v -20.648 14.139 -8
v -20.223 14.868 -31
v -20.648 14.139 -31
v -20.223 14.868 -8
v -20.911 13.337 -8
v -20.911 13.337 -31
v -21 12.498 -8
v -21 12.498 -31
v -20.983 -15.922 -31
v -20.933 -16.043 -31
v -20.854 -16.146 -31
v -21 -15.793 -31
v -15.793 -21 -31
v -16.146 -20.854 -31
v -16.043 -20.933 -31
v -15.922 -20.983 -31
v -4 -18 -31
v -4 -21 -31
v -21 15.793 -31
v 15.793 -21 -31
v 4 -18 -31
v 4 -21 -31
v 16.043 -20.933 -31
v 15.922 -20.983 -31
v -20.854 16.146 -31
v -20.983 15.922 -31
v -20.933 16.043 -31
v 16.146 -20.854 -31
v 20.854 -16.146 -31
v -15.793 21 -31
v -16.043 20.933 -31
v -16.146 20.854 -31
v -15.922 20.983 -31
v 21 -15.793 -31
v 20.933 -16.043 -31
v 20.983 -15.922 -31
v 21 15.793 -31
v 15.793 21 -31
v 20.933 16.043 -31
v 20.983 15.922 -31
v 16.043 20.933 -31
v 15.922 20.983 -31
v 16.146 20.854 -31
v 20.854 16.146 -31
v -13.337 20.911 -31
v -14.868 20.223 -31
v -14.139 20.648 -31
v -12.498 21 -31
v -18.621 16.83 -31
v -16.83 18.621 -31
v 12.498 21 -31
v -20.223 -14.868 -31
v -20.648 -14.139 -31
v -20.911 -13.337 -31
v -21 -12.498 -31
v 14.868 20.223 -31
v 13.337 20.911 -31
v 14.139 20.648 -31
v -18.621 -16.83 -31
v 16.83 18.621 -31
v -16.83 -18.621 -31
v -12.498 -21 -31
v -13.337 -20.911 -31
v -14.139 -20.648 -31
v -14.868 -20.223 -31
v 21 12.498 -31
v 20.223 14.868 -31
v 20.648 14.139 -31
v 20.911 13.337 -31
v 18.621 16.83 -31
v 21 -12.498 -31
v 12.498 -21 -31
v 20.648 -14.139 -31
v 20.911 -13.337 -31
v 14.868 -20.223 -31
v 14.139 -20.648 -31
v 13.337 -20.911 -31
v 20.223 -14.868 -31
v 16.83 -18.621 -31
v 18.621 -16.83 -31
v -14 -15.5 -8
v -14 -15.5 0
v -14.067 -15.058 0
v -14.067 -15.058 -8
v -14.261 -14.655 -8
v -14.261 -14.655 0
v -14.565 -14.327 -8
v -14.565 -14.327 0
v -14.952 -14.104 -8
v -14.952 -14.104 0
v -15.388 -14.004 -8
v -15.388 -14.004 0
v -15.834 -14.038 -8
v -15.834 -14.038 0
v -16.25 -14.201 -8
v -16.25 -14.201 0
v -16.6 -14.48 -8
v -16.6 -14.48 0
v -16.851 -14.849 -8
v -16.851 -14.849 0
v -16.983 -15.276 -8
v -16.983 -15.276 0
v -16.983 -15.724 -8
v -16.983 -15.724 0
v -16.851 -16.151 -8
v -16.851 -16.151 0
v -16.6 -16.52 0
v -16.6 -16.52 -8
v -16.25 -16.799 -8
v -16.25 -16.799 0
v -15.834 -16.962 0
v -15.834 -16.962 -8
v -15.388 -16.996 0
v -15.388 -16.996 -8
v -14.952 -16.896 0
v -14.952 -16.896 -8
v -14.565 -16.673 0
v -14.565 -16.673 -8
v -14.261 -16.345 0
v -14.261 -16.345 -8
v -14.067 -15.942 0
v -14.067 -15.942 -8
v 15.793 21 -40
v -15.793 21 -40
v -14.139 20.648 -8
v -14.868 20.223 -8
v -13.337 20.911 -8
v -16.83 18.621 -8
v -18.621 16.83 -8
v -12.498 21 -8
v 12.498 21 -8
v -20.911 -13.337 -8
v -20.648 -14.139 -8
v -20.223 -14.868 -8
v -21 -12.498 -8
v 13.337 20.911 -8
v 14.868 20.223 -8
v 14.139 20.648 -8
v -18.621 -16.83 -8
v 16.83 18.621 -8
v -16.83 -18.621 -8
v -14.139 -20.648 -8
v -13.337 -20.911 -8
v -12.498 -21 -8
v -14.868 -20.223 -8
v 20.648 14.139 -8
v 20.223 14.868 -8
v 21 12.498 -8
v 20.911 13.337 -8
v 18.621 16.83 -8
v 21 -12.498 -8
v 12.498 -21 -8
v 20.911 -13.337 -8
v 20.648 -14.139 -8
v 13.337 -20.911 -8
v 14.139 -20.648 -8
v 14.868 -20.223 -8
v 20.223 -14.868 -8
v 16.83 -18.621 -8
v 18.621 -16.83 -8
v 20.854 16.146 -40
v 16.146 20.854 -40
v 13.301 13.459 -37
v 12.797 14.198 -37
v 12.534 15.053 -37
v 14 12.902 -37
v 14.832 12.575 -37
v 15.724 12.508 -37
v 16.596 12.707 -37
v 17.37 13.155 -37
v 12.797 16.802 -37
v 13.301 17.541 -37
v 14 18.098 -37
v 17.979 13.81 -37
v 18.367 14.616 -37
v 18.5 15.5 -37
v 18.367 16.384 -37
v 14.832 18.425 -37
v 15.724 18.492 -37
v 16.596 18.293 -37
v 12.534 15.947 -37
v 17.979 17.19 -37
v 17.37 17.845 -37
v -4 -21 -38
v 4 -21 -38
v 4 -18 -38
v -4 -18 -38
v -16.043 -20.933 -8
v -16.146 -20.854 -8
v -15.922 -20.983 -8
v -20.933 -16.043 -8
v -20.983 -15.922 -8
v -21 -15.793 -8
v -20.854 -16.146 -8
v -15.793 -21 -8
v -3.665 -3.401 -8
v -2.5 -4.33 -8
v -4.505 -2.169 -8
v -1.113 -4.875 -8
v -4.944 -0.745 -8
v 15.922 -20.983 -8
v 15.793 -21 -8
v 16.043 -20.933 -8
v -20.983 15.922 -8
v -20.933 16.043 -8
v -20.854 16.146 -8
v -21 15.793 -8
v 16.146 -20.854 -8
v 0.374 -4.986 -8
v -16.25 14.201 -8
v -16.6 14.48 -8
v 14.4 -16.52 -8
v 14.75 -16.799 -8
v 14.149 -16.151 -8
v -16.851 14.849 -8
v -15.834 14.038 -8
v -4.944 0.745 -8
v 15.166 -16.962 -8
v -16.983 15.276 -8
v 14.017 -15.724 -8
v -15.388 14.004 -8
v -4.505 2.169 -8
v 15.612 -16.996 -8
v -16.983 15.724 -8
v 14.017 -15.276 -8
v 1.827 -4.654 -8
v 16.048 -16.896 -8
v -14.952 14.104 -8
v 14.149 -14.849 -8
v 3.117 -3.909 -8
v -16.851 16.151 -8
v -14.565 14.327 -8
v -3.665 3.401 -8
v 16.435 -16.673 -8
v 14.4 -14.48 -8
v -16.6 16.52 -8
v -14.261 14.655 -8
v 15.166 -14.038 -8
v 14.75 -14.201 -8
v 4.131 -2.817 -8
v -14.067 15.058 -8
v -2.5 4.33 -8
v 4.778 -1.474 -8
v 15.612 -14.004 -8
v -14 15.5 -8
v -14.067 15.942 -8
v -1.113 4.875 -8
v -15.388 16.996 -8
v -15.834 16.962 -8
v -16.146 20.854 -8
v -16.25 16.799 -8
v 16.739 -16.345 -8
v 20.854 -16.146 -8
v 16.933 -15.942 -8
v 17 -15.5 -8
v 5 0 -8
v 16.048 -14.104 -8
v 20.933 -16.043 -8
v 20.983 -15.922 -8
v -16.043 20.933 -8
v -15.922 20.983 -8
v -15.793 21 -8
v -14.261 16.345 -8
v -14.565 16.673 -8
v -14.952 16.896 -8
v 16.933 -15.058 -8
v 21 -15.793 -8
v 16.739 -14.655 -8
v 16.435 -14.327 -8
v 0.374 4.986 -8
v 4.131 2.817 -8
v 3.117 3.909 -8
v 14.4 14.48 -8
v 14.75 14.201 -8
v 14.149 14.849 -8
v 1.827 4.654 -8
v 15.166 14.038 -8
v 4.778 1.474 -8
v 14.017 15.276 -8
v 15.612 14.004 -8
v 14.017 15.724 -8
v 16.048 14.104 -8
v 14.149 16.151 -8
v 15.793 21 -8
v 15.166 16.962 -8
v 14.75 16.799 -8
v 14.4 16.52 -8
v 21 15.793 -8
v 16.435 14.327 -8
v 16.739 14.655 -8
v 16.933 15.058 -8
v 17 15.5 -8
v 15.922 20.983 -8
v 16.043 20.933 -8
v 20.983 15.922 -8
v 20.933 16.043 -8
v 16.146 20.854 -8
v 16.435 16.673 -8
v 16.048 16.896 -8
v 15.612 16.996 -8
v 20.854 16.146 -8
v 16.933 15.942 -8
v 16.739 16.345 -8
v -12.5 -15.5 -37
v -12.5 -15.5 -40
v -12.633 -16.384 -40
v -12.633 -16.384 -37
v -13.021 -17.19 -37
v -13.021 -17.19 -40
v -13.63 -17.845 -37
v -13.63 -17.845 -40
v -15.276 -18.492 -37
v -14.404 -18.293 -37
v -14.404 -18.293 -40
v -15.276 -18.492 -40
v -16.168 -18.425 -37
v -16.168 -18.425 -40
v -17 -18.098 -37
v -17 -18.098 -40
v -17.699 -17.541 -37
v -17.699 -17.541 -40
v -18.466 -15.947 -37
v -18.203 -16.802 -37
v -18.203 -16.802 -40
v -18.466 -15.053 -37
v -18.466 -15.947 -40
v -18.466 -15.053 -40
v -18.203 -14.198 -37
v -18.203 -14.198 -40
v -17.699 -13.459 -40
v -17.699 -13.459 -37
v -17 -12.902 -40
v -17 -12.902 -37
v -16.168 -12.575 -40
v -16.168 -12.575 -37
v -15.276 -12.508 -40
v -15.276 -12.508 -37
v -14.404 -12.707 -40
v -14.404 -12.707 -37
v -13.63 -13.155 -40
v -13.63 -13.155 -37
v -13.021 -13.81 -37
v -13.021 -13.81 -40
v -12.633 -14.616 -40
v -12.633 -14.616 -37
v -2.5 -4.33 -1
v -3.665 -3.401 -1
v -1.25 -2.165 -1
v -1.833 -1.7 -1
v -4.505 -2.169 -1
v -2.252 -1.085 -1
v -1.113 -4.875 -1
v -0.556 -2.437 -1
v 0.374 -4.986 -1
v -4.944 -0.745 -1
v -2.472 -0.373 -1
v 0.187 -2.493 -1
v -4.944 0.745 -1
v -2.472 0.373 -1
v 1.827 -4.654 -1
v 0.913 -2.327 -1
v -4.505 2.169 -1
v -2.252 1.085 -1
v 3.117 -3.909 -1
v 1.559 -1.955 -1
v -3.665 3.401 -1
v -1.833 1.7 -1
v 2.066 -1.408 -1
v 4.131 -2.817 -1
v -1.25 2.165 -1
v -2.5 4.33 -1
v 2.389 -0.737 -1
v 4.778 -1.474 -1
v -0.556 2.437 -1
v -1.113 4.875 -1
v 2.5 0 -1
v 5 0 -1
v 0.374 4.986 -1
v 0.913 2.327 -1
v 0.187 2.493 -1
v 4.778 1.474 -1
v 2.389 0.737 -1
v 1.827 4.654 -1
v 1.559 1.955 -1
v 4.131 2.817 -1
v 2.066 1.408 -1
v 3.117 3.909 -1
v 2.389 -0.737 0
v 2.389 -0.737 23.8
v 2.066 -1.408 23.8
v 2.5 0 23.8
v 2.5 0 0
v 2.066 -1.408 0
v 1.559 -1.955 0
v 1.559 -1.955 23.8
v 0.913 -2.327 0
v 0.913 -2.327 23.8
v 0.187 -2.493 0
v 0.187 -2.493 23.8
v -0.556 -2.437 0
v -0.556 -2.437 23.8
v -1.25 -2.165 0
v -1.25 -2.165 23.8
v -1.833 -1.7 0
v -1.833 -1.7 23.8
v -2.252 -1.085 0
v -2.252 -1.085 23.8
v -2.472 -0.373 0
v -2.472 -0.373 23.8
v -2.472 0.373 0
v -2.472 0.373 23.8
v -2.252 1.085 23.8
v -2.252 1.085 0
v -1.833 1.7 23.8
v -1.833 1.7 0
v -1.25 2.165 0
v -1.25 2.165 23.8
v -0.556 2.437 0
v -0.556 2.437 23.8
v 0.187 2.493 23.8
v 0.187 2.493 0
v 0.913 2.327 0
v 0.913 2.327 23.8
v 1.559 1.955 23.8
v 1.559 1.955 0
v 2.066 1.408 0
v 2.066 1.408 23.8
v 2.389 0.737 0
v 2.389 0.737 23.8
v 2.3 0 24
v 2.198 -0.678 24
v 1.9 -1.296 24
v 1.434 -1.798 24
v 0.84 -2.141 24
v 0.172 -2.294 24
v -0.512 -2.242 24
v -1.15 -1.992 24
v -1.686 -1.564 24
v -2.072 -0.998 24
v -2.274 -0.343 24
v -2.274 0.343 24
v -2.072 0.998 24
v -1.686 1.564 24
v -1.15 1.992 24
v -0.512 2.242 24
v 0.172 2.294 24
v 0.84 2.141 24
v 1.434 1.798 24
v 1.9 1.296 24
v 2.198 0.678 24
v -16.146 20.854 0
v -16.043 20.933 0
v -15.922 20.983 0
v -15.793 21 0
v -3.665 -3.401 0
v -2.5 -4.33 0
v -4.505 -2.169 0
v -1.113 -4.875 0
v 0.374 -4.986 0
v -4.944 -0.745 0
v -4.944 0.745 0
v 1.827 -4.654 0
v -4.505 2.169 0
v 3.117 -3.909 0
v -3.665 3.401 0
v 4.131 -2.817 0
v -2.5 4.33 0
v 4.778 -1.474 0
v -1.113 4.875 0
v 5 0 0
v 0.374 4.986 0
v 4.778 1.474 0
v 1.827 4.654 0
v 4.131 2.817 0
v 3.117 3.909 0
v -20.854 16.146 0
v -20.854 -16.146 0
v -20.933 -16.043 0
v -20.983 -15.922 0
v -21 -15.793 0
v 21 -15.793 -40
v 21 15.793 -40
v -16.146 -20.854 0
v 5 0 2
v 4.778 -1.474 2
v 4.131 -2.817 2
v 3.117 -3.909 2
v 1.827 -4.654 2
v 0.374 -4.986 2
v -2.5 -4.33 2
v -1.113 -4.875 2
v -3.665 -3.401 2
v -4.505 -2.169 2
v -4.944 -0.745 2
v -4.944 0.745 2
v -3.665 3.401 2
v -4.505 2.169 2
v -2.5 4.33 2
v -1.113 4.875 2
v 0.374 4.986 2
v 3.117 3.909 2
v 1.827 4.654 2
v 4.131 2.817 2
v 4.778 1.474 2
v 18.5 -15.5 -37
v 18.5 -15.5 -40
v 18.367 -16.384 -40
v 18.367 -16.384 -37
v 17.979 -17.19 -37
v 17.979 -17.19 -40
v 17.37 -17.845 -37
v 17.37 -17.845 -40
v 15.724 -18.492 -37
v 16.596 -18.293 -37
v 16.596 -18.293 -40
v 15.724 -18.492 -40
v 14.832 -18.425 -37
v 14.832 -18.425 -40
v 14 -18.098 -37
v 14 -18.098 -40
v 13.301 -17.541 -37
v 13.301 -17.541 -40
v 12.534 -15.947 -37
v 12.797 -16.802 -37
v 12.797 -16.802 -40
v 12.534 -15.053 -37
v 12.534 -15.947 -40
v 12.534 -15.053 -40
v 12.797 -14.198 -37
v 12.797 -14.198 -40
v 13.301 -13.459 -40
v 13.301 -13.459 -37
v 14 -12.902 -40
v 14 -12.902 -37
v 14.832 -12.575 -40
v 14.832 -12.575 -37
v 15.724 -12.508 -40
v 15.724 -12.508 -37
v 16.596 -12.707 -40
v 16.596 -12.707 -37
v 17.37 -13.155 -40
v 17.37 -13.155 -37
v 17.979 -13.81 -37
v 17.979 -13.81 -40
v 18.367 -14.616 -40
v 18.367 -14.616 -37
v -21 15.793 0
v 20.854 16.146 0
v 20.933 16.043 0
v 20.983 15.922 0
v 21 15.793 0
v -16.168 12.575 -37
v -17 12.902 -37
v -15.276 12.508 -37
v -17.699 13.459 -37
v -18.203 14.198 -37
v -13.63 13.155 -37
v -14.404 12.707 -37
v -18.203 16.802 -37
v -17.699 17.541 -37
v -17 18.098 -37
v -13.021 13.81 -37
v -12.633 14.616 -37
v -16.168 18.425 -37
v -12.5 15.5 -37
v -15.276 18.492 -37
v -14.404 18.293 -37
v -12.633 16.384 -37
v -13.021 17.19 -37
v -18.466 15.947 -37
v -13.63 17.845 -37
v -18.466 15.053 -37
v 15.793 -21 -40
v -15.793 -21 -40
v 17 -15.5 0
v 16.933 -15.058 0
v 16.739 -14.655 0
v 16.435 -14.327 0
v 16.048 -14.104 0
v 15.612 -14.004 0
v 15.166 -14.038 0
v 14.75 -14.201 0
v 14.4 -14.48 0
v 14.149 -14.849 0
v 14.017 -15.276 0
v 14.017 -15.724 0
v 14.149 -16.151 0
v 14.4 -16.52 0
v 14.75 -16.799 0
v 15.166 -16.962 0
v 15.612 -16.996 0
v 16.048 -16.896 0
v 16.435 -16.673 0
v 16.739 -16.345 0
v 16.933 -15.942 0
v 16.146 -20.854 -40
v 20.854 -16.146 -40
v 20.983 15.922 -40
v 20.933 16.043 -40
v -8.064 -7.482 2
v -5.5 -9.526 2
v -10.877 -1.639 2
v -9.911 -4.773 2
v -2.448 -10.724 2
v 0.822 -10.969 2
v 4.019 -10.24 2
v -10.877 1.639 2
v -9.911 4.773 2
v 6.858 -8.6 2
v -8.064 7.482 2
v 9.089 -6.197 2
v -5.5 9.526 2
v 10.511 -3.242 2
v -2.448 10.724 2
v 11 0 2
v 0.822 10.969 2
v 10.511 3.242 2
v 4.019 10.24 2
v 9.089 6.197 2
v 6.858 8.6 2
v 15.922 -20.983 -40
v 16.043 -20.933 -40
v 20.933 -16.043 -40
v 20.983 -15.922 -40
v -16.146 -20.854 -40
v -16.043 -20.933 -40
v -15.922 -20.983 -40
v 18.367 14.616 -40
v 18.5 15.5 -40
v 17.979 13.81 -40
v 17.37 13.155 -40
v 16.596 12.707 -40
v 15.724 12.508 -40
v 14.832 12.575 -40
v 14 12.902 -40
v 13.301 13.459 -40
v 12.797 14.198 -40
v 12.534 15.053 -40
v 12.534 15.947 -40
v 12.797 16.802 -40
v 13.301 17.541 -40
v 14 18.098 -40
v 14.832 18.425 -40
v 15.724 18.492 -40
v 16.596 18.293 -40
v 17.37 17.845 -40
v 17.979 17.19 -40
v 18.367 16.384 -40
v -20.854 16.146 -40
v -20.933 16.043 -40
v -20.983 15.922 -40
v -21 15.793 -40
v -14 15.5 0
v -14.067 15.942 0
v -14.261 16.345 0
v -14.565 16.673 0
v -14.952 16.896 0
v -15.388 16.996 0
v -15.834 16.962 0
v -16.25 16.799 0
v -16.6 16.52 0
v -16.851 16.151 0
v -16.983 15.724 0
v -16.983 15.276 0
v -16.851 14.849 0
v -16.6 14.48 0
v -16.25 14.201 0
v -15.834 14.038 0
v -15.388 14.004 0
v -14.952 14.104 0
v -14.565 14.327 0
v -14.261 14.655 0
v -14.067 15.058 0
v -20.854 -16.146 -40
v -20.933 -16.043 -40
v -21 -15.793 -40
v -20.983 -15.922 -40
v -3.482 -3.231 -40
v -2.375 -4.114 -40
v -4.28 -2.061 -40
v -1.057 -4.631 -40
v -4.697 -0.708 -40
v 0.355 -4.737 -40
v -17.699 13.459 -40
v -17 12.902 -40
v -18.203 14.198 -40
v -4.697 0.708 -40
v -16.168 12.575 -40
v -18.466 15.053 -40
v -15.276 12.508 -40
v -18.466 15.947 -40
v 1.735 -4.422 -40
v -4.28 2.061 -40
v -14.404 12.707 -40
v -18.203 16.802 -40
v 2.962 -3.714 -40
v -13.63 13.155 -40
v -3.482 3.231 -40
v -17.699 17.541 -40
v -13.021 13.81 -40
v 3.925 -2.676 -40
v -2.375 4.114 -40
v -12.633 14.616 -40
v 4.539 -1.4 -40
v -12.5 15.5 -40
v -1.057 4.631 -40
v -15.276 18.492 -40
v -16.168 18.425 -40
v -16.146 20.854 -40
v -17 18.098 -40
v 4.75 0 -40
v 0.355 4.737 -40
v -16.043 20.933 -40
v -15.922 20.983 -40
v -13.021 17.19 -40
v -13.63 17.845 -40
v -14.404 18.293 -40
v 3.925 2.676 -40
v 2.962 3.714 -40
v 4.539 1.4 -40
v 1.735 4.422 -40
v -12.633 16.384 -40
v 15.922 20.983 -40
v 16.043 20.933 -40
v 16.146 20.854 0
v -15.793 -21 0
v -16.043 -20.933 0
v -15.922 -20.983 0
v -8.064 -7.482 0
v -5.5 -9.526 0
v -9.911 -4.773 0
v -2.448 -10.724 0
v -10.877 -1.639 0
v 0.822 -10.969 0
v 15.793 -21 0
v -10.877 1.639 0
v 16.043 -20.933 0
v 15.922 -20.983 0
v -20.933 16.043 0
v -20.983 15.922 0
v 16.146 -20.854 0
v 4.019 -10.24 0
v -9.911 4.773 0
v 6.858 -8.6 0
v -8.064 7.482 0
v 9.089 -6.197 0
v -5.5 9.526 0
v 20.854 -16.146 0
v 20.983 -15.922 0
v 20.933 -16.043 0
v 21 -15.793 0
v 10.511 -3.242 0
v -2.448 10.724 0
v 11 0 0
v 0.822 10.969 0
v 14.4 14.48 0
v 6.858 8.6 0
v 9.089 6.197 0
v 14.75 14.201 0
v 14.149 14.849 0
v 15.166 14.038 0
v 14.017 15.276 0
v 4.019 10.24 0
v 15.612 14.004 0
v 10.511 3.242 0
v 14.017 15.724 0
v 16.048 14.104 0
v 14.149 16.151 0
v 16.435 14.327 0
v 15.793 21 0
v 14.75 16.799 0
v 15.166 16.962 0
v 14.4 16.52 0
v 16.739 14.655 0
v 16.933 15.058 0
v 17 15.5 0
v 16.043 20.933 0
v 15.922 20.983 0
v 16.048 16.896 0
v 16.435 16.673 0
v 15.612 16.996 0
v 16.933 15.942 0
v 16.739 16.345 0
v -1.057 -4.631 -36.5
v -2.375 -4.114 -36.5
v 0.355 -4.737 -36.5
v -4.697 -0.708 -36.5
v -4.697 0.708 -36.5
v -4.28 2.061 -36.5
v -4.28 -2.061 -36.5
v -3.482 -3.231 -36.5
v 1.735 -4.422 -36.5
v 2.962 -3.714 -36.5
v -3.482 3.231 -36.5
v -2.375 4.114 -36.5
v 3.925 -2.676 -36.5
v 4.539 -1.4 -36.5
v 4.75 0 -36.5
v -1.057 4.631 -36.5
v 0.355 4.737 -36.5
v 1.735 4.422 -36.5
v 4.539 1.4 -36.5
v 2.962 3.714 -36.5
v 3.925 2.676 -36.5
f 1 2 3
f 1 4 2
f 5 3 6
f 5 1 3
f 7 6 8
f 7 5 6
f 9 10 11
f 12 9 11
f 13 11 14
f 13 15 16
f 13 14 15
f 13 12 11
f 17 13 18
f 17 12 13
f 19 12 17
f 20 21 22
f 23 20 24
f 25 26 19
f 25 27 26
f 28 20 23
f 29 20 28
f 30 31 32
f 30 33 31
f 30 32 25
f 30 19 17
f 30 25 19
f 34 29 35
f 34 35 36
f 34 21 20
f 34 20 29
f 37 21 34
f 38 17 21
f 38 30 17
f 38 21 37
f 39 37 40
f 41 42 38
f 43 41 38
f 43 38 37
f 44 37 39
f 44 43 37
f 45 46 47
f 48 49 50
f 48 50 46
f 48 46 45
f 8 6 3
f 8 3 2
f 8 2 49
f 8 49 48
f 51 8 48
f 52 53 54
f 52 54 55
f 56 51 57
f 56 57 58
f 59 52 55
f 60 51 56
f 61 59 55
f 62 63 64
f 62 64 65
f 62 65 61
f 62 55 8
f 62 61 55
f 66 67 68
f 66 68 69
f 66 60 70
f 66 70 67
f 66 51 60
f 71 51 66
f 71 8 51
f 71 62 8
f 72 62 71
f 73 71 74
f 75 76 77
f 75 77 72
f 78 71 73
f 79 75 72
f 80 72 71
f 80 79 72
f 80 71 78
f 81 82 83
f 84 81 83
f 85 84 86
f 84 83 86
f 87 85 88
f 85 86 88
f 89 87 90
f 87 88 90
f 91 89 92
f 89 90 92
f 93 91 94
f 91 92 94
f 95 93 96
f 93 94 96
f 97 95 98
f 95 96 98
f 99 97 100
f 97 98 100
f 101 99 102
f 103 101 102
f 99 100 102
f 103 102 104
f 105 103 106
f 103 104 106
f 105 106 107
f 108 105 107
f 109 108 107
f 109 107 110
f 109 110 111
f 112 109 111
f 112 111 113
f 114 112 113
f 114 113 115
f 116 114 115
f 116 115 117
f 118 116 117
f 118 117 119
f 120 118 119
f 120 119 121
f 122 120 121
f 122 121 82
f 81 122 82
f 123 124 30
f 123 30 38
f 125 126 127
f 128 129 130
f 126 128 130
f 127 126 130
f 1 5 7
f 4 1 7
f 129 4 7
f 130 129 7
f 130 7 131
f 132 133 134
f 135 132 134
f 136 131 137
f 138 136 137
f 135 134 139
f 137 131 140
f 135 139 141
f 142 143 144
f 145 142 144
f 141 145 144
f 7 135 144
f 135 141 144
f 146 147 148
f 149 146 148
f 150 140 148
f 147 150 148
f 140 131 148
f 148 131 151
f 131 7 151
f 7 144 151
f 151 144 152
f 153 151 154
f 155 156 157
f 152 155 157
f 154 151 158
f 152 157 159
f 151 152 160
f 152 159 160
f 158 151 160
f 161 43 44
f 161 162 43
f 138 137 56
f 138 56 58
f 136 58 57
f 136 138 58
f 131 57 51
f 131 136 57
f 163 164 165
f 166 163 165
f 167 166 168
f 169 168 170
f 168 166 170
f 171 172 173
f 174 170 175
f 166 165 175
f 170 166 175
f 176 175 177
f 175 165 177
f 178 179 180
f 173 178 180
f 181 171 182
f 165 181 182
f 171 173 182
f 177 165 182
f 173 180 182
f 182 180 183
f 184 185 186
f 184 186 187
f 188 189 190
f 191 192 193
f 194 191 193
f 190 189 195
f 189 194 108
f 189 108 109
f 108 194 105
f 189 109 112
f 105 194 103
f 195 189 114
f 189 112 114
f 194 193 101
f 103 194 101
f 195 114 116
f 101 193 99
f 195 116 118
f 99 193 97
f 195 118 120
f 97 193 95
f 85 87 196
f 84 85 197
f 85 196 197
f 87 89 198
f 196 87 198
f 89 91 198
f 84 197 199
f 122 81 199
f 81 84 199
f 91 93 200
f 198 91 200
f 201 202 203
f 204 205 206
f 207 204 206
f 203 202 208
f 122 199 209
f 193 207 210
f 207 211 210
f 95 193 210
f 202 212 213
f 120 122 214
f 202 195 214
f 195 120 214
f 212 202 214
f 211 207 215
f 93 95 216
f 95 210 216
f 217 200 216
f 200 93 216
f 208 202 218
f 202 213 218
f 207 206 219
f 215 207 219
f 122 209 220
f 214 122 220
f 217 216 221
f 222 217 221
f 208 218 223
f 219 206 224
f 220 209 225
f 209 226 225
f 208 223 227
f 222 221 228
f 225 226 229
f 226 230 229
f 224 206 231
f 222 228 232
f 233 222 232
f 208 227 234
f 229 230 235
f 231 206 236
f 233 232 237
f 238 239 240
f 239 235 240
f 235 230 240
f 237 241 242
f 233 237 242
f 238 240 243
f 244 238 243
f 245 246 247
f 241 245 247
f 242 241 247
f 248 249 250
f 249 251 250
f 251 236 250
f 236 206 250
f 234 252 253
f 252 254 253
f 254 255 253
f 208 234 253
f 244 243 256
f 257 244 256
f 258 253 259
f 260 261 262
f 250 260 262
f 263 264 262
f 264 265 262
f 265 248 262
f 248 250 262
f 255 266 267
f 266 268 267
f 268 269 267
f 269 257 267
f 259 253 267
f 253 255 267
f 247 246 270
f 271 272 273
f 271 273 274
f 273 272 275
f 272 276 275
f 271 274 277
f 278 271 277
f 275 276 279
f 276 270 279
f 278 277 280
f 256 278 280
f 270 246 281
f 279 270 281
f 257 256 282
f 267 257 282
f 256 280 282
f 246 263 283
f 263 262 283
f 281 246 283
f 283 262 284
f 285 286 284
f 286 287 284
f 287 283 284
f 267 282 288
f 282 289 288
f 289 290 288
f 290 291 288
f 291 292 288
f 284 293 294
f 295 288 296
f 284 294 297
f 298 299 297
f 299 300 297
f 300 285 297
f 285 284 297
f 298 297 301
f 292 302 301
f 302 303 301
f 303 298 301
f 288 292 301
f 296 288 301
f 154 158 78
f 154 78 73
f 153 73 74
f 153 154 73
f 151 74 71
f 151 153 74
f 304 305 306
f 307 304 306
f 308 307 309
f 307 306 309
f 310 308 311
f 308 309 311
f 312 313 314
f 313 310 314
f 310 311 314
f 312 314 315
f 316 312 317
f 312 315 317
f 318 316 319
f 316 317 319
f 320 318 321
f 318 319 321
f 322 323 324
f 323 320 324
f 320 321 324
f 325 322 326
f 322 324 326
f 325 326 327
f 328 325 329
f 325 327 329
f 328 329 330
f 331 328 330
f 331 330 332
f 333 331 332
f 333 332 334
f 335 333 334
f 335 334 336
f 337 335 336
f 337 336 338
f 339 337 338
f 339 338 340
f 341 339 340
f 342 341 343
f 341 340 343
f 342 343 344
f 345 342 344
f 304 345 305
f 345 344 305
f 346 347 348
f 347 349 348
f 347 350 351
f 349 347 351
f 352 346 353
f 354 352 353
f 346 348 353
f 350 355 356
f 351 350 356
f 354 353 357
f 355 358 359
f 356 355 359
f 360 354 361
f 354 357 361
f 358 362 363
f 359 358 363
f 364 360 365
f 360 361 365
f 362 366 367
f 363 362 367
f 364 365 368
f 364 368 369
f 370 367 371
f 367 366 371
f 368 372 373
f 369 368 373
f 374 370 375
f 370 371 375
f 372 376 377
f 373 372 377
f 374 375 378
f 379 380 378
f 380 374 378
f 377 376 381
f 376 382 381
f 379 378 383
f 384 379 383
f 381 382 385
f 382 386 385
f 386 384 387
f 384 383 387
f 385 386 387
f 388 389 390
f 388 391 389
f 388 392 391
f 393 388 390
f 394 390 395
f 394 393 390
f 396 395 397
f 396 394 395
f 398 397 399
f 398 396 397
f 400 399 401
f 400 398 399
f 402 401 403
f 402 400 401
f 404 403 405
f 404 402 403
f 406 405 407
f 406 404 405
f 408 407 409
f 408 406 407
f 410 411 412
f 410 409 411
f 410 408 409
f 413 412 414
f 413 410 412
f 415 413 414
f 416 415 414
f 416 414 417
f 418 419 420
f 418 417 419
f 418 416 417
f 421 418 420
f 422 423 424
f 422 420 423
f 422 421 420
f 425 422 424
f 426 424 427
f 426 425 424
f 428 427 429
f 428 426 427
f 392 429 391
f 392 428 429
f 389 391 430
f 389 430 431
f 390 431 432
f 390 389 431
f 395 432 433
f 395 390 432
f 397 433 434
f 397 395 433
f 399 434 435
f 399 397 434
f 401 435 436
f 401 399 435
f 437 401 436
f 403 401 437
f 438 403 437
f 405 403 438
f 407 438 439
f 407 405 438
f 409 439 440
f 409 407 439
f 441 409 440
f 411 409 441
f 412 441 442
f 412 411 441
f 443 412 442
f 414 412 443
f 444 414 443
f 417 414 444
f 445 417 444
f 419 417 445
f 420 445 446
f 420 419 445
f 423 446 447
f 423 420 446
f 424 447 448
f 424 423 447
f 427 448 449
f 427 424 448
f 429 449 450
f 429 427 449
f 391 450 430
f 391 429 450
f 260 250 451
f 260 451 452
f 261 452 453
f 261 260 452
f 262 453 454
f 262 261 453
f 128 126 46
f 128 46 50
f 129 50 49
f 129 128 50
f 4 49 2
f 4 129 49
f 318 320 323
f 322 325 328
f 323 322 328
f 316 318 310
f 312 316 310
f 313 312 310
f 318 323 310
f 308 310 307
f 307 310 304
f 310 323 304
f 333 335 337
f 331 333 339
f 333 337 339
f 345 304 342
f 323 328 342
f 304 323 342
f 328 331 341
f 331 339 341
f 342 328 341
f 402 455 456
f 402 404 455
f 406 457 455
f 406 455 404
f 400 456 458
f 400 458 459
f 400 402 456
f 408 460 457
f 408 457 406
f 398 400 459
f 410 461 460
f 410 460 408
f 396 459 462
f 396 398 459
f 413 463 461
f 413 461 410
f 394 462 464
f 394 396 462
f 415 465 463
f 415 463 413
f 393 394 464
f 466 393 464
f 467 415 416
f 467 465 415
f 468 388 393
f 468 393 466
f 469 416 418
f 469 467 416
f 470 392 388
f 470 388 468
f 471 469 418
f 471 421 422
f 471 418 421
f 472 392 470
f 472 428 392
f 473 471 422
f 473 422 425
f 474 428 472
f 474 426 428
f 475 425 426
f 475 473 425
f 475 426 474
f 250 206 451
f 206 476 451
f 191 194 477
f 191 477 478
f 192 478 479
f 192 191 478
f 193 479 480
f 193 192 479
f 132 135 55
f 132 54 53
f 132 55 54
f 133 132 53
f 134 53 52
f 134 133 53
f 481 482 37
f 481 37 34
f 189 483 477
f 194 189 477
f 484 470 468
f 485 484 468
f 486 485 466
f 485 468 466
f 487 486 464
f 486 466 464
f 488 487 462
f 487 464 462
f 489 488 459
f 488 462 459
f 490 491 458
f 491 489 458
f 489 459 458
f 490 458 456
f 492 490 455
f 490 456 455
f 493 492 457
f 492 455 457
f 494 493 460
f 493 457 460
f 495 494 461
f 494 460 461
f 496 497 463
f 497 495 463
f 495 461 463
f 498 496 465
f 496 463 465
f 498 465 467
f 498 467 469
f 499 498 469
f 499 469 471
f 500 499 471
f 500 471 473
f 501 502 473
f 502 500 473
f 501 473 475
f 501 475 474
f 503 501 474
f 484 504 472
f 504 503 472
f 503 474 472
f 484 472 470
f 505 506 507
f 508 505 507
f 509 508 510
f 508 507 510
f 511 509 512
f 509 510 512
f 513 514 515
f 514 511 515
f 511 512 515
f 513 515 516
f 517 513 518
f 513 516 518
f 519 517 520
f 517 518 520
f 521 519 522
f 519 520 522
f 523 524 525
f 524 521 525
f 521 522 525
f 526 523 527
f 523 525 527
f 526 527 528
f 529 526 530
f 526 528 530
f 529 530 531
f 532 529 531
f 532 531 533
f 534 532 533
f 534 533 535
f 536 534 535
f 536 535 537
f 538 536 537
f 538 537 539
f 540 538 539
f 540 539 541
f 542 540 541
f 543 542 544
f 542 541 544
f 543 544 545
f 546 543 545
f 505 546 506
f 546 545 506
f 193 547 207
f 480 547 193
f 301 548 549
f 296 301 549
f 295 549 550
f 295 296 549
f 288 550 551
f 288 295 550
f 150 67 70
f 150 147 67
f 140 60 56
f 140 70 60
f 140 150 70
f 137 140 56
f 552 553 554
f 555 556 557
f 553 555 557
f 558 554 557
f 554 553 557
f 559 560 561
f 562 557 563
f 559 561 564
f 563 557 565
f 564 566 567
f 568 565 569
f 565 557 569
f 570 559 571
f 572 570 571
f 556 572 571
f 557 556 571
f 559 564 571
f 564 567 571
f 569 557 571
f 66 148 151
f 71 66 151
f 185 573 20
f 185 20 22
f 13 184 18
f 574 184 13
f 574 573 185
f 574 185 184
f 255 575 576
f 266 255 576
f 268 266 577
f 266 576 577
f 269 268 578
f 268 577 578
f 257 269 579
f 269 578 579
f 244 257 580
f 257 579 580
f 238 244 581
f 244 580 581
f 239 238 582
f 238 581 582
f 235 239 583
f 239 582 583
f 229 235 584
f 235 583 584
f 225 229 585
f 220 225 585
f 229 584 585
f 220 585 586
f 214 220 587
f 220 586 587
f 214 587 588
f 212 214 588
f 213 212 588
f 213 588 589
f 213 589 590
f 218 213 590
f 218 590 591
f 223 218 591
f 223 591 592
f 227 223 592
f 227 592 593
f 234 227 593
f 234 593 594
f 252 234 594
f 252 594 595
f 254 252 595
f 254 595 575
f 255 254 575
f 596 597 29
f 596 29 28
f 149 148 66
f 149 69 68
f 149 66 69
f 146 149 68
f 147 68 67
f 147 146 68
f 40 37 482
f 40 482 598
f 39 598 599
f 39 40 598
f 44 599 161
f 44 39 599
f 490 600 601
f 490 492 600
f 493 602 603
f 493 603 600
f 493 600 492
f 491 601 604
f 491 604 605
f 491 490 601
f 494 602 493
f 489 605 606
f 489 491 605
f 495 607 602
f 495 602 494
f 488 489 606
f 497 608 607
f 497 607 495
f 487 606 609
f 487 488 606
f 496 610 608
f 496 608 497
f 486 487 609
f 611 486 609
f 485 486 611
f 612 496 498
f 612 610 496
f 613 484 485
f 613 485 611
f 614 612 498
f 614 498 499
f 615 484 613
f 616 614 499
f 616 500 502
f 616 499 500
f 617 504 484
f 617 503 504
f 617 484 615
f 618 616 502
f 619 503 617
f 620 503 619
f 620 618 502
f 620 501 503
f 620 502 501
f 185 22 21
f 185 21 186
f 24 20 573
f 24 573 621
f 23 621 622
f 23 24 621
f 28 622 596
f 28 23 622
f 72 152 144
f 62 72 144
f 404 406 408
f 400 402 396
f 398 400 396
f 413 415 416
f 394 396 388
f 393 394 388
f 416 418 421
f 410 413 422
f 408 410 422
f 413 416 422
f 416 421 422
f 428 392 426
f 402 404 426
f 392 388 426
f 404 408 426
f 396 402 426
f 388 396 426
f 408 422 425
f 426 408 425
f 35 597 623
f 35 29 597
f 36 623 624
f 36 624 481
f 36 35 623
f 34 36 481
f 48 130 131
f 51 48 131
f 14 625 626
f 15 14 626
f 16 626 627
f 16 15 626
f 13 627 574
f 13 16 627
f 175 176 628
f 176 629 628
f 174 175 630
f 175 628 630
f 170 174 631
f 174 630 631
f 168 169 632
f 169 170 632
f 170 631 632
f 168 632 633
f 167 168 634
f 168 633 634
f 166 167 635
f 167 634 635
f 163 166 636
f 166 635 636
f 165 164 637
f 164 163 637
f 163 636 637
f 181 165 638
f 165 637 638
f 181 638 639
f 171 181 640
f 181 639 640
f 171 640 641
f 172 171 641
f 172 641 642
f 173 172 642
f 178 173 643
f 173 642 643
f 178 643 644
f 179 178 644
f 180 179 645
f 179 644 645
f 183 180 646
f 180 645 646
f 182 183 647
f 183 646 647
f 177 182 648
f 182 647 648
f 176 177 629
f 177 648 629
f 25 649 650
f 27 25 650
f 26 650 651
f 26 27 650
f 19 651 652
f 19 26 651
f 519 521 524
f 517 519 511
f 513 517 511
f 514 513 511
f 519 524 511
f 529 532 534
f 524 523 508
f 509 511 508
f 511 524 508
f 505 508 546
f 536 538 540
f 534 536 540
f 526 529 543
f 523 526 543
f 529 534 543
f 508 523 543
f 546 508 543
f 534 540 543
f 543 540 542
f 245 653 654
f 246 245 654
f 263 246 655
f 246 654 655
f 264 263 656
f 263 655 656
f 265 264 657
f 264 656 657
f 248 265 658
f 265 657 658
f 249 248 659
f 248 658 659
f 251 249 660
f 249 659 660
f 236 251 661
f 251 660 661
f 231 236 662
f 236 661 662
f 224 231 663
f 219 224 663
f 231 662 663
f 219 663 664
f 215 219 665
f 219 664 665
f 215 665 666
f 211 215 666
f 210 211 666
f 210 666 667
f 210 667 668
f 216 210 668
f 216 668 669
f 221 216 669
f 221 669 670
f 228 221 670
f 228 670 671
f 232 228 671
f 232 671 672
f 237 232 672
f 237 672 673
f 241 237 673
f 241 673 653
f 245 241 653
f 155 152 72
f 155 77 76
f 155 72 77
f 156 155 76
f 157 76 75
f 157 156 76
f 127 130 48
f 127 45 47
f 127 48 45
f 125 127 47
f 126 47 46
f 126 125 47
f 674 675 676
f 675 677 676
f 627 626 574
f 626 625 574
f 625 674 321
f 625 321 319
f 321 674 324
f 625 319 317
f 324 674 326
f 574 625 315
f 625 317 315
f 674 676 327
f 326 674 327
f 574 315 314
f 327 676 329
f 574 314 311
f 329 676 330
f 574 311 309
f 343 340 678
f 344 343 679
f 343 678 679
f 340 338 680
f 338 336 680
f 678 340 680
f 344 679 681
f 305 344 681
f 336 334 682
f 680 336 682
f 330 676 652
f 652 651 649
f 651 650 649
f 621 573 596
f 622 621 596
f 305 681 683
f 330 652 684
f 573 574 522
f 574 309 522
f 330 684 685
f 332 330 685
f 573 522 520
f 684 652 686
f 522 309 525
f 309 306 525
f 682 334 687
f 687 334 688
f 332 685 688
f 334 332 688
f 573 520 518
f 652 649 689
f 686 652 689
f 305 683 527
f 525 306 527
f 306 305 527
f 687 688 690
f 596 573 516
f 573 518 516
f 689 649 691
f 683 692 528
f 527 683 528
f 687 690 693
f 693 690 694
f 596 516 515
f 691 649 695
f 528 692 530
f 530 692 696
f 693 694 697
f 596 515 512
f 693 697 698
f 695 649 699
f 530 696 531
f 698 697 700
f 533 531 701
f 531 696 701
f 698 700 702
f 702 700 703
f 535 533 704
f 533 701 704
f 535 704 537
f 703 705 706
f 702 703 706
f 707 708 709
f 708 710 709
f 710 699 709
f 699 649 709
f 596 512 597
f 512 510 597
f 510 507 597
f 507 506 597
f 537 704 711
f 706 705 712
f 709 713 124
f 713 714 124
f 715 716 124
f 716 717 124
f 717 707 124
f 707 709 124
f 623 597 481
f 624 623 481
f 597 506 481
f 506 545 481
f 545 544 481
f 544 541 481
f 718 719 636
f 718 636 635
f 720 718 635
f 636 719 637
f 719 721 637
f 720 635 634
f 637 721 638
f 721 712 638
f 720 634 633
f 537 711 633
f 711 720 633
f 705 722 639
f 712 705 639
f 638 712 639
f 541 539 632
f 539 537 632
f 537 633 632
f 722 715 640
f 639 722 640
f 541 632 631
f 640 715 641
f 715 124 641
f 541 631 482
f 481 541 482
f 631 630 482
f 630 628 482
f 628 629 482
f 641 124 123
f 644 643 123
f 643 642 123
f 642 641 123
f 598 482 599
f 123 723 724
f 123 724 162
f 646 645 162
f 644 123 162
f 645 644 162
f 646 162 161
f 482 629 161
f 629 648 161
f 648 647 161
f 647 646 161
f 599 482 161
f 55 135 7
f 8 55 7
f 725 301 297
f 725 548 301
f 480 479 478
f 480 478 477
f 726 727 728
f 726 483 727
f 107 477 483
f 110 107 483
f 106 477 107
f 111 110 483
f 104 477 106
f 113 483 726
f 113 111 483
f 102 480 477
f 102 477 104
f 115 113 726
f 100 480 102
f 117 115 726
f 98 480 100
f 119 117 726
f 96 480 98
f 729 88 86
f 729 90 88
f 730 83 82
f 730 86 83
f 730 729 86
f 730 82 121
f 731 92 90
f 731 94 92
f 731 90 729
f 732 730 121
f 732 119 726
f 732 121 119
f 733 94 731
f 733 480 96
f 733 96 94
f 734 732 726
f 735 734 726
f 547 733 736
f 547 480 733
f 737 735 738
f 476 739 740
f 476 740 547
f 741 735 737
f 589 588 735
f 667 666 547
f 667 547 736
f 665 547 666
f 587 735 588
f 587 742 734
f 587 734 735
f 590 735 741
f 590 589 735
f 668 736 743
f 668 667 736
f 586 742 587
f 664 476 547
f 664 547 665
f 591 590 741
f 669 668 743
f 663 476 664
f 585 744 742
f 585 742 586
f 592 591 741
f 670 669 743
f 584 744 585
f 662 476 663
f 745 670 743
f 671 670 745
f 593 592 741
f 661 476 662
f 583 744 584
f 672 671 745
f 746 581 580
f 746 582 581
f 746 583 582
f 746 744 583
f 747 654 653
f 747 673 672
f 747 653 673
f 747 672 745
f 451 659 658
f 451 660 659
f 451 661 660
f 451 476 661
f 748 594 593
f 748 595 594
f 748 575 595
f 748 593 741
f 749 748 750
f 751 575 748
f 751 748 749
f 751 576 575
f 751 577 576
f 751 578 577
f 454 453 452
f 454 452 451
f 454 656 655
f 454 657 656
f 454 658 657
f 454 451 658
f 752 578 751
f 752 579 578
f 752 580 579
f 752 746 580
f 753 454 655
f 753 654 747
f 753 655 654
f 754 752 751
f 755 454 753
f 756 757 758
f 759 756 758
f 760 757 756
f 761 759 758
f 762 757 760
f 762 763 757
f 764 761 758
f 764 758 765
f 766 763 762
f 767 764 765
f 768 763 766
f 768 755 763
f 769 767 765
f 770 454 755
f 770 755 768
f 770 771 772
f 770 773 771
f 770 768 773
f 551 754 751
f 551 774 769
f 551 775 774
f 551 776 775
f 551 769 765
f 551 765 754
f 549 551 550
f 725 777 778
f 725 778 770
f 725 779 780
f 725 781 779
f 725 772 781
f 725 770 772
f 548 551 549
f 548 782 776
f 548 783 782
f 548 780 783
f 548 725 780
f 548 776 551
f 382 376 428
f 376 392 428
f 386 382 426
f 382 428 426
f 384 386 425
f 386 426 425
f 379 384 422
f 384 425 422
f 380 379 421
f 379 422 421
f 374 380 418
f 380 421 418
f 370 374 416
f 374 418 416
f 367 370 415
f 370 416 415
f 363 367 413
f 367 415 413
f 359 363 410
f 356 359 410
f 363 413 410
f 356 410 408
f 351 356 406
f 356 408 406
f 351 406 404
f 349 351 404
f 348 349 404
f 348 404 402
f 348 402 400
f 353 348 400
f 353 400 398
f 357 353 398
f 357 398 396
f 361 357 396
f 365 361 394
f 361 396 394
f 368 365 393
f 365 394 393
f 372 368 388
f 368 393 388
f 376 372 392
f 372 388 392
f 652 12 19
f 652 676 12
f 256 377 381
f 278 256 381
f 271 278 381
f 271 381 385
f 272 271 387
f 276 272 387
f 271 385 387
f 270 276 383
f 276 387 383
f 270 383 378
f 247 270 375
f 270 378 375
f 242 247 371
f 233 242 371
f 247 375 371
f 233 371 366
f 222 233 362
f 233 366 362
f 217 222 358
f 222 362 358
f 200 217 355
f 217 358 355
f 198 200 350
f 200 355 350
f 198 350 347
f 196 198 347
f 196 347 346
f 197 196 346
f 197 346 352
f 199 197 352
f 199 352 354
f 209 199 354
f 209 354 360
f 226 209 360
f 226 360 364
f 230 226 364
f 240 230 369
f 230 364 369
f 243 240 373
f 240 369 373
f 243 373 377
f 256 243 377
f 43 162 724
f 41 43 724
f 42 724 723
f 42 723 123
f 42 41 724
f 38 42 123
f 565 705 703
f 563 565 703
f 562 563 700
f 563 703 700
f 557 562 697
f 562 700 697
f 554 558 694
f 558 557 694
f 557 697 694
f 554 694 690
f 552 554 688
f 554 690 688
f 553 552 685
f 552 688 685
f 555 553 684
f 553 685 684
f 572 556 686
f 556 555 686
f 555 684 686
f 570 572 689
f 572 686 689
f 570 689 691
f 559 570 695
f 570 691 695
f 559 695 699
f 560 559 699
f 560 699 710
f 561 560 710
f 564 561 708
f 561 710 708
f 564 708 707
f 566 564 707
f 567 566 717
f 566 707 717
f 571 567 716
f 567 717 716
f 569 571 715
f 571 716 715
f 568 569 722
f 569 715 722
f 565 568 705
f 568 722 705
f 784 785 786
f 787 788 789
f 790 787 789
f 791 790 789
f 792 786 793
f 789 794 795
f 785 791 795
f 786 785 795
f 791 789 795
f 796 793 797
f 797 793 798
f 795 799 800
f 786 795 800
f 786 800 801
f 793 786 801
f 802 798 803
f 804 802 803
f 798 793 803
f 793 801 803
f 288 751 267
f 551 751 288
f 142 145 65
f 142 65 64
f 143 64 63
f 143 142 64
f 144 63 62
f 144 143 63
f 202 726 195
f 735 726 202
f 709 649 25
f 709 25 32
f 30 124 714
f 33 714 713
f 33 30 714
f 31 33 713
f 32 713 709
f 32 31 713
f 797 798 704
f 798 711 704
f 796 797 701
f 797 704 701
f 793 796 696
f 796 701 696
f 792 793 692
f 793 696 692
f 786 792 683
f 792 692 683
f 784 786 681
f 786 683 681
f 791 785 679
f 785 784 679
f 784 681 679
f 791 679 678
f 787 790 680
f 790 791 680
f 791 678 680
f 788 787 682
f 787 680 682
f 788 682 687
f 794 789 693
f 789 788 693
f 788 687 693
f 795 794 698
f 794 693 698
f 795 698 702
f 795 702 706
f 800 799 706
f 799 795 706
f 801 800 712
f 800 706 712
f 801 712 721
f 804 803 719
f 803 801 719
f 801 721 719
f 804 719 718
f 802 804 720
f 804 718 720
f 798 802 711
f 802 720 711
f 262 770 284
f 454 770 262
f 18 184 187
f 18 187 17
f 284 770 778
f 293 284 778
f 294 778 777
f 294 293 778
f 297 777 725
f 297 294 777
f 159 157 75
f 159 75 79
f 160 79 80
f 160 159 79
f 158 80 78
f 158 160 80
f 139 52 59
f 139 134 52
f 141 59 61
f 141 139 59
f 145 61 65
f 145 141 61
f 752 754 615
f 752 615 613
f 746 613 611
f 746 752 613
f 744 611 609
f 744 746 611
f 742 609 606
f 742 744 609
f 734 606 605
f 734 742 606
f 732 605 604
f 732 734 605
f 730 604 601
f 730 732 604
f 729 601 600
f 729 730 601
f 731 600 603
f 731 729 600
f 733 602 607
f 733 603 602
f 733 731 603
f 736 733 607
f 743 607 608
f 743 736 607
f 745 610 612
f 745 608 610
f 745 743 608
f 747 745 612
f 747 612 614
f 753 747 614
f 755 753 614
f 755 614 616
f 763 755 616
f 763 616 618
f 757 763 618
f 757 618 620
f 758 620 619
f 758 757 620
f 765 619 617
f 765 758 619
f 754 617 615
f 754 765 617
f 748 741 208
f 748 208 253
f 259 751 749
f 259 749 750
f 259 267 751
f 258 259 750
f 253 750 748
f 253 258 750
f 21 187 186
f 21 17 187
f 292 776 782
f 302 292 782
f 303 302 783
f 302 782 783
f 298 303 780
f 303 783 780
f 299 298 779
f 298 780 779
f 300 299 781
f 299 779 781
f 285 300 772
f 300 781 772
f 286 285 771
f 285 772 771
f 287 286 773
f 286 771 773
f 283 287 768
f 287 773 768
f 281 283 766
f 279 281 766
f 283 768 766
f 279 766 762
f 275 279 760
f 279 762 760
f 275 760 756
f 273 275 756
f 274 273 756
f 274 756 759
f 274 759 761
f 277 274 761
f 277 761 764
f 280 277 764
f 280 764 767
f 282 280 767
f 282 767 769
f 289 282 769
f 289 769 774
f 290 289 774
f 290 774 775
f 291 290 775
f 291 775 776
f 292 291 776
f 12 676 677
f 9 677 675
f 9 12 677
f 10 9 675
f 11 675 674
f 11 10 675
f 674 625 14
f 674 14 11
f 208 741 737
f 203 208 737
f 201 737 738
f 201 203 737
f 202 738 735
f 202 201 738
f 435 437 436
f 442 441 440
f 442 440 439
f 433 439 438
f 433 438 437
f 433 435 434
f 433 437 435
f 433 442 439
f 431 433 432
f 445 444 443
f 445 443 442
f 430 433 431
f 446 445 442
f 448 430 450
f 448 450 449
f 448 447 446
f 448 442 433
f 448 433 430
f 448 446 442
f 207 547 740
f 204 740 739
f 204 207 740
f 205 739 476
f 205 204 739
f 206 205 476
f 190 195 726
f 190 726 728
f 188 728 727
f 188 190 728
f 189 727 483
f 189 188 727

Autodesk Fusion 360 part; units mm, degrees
sketch "Sketch1" plane through (0, 0, 0) normal (0, 0, 1) x (1, 0, 0) in component "Component"
  line L0 (16, 21) -> (-16, 21)
  line L1 (-21, 16) -> (-21, -16)
  line L2 (-16, -21) -> (16, -21)
  line L3 (21, -16) -> (21, 16)
  line L4 (21, 21) -> (-21, -21) construction
  line L5 (-21, 21) -> (21, -21) construction
  line L6 (-15.6506, 22.8547) -> (-16, 22.8547)
  line L7 (-21, 16) -> (-16, 21)
  line L8 (21, 16) -> (16, 21)
  line L9 (-16, -21) -> (-21, -16)
  line L10 (16, -21) -> (21, -16)
  circle A0 centre (-15.5, 15.5) radius 1.5
  circle A1 centre (15.5, 15.5) radius 1.5
  circle A2 centre (15.5, -15.5) radius 1.5
  circle A3 centre (-15.5, -15.5) radius 1.5
  circle A4 centre (0, 0) radius 11
  circle A5 centre (0, 0) radius 5
  circle A6 centre (0, 0) radius 2.5
  line L11 (-15.5, 15.5) -> (24, 15.5) construction
  line L12 (-15.5, -15.5) -> (24, -15.5) construction
  line L13 (15.5, 29) -> (15.5, -23) construction
  dimension "d3" = 3
  dimension "d4" = 15.5
  dimension "d5" = 15.5
  dimension "d6" = 5
  dimension "d58" = 15.5
extrude "Extrude1" add sketch "Sketch1" along normal blind 2 contours A4 makes body 1 in component "Component"
extrude "Extrude2" add sketch "Sketch1" along normal blind 24 separate body contours A6 makes body 2 in component "Component"
extrude "Extrude3" add sketch "Sketch1" against normal blind 1 separate body contours A5 makes body 3 in component "Component"
extrude "Extrude4" add sketch "Sketch1" against normal blind 8 contours L0 L1 L2 L3 L7 L8 L9 L10 | A4 bodies 1 3 in component "Component"
sketch "Sketch2" plane through (0, 0, -8) normal (0, 0, -1) x (1, 0, 0) in component "Component"
  circle A0 centre (15.5, 15.5) radius 1.5
  circle A1 centre (15.5, -15.5) radius 1.5
  circle A2 centre (0, 0) radius 5
  circle A3 centre (-15.5, 15.5) radius 1.5
  circle A4 centre (-15.5, -15.5) radius 1.5
  line L0 (16, 21) -> (-16, 21)
  line L1 (-16, 21) -> (-21, 16)
  line L2 (-21, 16) -> (-21, -16)
  line L3 (-21, -16) -> (-16, -21)
  line L4 (-16, -21) -> (16, -21)
  line L5 (16, -21) -> (21, -16)
  line L6 (21, -16) -> (21, 16)
  line L7 (21, 16) -> (16, 21)
  line L8 (12.4984, 21) -> (-12.4984, 21)
  line L9 (-21, 12.4984) -> (-21, -12.4984)
  line L10 (-12.4984, -21) -> (12.4984, -21)
  line L11 (21, -12.4984) -> (21, 12.4984)
  line L12 (21, 21) -> (-21, -21) construction
  line L13 (-21, 21) -> (21, -21) construction
  arc A5 (-14.8678, 20.2227) -> (-20.2227, 14.8678) centre (0, 0) ccw
  arc A6 (20.2227, 14.8678) -> (14.8678, 20.2227) centre (0, 0) ccw
  arc A7 (-20.2227, -14.8678) -> (-14.8678, -20.2227) centre (0, 0) ccw
  arc A8 (14.8678, -20.2227) -> (21, -13.7481) centre (0, 0) ccw
  arc A9 (-12.4984, 21) -> (-14.8678, 20.2227) centre (-12.4984, 17) ccw
  arc A10 (-20.2227, 14.8678) -> (-21, 12.4984) centre (-17, 12.4984) ccw
  arc A11 (14.8678, 20.2227) -> (12.4984, 21) centre (12.4984, 17) ccw
  arc A12 (20.2227, -14.8678) -> (21, -12.4984) centre (17, -12.4984) ccw
  arc A13 (21, 12.4984) -> (20.2227, 14.8678) centre (17, 12.4984) ccw
  arc A14 (12.4984, -21) -> (14.8678, -20.2227) centre (12.4984, -17) ccw
  arc A15 (-14.8678, -20.2227) -> (-12.4984, -21) centre (-12.4984, -17) ccw
  arc A16 (-21, -12.4984) -> (-20.2227, -14.8678) centre (-17, -12.4984) ccw
  dimension "d15" = 42
  dimension "d16" = 42
  dimension "d17" = 50.2
  dimension "d18" = 4
  dimension "d19" = 4
  dimension "d20" = 4
  dimension "d21" = 4
  dimension "d22" = 4
  dimension "d23" = 4
  dimension "d24" = 4
  dimension "d25" = 4
extrude "Extrude5" add sketch "Sketch2" along normal blind 23 separate body contours A0 | A1 | A2 | A3 | A4 | L0 L2 L4 L6 L8 L9 L10 L11 A5 A6 A7 A8 A9 A10 A11 A12 A13 A14 A15 A16 makes body 4 in component "Component"
ref_plane "WorkPlane1" through (0, 0, -40) normal (0, 0, 1) x (1, 0, 0) in component "Component"
sketch "Sketch3" plane through (-15.5, 15.5, -40) normal (0, 0, 1) x (1, 0, 0) in component "Component"
  circle A0 centre (15.5, -15.5) radius 4.75
  line L0 (31.5, -36.5) -> (-0.5, -36.5)
  line L1 (-0.5, -36.5) -> (-5.5, -31.5)
  line L2 (-5.5, -31.5) -> (-5.5, 0.5)
  line L3 (-5.5, 0.5) -> (-0.5, 5.5)
  line L4 (-0.5, 5.5) -> (31.5, 5.5)
  line L5 (31.5, 5.5) -> (36.5, 0.5)
  line L6 (36.5, 0.5) -> (36.5, -31.5)
  line L7 (36.5, -31.5) -> (31.5, -36.5)
  circle A1 centre (31, -31) radius 3
  circle A2 centre (31, 0) radius 3
  circle A3 centre (0, -31) radius 3
  circle A4 centre (0, 0) radius 3
  dimension "d29" = 6
  dimension "d30" = 6
  dimension "d31" = 6
  dimension "d32" = 6
  dimension "d33" = 9.5
extrude "Extrude6" add sketch "Sketch3" along normal blind 9 separate body contours A0 | L0 L1 L2 L3 L4 L5 L6 L7 | A1 | A2 | A3 | A4 makes body 5 in component "Component"
extrude "Extrude8" cut sketch "Sketch3" along normal blind 3 contours A1 | A2 | A3 | A4 bodies 5 in component "Component"
extrude "Extrude9" cut sketch "Sketch3" along normal blind 3.5 contours A0 bodies 5 in component "Component"
chamfer "Chamfer1" distance 0.2 angle 45 1 edges at (-2.3308, -0.904, 24) on bodies 2 in component "Component"
fillet "Fillet1" radius 0.5 16 edges at (16, 21, -4) (21, 16, -4) (21, -16, -4) (16, -21, -4) (-16, -21, -4) (-21, -16, -4) (-21, 16, -4) (-16, 21, -4) (16, 21, -35.5) (21, 16, -35.5) (21, -16, -35.5) (16, -21, -35.5) (-21, -16, -35.5) (-16, -21, -35.5) (-16, 21, -35.5) (-21, 16, -35.5) on bodies 1 5 in component "Component"
sketch "Sketch4" plane through (0, -21, 0) normal (0, -1, 0) x (1, 0, 0) in component "Component"
  line L0 (-15.7929, -31) -> (-15.7929, -40)
  line L1 (-15.7929, -40) -> (15.7929, -40)
  line L2 (15.7929, -40) -> (15.7929, -31)
  line L3 (15.7929, -31) -> (-15.7929, -31)
  line L4 (-4, -31) -> (4, -31)
  line L5 (4, -31) -> (4, -38)
  line L6 (4, -38) -> (-4, -38)
  line L7 (-4, -38) -> (-4, -31)
  line L8 (0, -40) -> (0, -26) construction
  dimension "d53" = 8
  dimension "d54" = 7
  dimension "d55" = 4
extrude "Extrude10" cut sketch "Sketch4" against normal blind 3 contours L3 L4 L5 L6 L7 bodies 5 in component "Component"
thread "Thread1" thread length 5 thread offset 0 in component "Component"
thread "Thread2" thread length 5 thread offset 0 in component "Component"
component "Component" placed x (1, 0, 0) y (0, 1, 0) z (0, 0, 1) at (0, 0, 0)
equation "d4 = ( 31 / 2 ) * 1 mm"
equation "d5 = d4"
equation "d9 = AxleLength"
equation "d26 = MotorLength - BackCoverLength - FrontCoverLength"
equation "d34 = BackCoverLength"
equation "MotorLength = 40 mm"
equation "AxleLength = 24 mm"
equation "FrontCoverLength = 8 mm"
equation "BackCoverLength = 9 mm"
